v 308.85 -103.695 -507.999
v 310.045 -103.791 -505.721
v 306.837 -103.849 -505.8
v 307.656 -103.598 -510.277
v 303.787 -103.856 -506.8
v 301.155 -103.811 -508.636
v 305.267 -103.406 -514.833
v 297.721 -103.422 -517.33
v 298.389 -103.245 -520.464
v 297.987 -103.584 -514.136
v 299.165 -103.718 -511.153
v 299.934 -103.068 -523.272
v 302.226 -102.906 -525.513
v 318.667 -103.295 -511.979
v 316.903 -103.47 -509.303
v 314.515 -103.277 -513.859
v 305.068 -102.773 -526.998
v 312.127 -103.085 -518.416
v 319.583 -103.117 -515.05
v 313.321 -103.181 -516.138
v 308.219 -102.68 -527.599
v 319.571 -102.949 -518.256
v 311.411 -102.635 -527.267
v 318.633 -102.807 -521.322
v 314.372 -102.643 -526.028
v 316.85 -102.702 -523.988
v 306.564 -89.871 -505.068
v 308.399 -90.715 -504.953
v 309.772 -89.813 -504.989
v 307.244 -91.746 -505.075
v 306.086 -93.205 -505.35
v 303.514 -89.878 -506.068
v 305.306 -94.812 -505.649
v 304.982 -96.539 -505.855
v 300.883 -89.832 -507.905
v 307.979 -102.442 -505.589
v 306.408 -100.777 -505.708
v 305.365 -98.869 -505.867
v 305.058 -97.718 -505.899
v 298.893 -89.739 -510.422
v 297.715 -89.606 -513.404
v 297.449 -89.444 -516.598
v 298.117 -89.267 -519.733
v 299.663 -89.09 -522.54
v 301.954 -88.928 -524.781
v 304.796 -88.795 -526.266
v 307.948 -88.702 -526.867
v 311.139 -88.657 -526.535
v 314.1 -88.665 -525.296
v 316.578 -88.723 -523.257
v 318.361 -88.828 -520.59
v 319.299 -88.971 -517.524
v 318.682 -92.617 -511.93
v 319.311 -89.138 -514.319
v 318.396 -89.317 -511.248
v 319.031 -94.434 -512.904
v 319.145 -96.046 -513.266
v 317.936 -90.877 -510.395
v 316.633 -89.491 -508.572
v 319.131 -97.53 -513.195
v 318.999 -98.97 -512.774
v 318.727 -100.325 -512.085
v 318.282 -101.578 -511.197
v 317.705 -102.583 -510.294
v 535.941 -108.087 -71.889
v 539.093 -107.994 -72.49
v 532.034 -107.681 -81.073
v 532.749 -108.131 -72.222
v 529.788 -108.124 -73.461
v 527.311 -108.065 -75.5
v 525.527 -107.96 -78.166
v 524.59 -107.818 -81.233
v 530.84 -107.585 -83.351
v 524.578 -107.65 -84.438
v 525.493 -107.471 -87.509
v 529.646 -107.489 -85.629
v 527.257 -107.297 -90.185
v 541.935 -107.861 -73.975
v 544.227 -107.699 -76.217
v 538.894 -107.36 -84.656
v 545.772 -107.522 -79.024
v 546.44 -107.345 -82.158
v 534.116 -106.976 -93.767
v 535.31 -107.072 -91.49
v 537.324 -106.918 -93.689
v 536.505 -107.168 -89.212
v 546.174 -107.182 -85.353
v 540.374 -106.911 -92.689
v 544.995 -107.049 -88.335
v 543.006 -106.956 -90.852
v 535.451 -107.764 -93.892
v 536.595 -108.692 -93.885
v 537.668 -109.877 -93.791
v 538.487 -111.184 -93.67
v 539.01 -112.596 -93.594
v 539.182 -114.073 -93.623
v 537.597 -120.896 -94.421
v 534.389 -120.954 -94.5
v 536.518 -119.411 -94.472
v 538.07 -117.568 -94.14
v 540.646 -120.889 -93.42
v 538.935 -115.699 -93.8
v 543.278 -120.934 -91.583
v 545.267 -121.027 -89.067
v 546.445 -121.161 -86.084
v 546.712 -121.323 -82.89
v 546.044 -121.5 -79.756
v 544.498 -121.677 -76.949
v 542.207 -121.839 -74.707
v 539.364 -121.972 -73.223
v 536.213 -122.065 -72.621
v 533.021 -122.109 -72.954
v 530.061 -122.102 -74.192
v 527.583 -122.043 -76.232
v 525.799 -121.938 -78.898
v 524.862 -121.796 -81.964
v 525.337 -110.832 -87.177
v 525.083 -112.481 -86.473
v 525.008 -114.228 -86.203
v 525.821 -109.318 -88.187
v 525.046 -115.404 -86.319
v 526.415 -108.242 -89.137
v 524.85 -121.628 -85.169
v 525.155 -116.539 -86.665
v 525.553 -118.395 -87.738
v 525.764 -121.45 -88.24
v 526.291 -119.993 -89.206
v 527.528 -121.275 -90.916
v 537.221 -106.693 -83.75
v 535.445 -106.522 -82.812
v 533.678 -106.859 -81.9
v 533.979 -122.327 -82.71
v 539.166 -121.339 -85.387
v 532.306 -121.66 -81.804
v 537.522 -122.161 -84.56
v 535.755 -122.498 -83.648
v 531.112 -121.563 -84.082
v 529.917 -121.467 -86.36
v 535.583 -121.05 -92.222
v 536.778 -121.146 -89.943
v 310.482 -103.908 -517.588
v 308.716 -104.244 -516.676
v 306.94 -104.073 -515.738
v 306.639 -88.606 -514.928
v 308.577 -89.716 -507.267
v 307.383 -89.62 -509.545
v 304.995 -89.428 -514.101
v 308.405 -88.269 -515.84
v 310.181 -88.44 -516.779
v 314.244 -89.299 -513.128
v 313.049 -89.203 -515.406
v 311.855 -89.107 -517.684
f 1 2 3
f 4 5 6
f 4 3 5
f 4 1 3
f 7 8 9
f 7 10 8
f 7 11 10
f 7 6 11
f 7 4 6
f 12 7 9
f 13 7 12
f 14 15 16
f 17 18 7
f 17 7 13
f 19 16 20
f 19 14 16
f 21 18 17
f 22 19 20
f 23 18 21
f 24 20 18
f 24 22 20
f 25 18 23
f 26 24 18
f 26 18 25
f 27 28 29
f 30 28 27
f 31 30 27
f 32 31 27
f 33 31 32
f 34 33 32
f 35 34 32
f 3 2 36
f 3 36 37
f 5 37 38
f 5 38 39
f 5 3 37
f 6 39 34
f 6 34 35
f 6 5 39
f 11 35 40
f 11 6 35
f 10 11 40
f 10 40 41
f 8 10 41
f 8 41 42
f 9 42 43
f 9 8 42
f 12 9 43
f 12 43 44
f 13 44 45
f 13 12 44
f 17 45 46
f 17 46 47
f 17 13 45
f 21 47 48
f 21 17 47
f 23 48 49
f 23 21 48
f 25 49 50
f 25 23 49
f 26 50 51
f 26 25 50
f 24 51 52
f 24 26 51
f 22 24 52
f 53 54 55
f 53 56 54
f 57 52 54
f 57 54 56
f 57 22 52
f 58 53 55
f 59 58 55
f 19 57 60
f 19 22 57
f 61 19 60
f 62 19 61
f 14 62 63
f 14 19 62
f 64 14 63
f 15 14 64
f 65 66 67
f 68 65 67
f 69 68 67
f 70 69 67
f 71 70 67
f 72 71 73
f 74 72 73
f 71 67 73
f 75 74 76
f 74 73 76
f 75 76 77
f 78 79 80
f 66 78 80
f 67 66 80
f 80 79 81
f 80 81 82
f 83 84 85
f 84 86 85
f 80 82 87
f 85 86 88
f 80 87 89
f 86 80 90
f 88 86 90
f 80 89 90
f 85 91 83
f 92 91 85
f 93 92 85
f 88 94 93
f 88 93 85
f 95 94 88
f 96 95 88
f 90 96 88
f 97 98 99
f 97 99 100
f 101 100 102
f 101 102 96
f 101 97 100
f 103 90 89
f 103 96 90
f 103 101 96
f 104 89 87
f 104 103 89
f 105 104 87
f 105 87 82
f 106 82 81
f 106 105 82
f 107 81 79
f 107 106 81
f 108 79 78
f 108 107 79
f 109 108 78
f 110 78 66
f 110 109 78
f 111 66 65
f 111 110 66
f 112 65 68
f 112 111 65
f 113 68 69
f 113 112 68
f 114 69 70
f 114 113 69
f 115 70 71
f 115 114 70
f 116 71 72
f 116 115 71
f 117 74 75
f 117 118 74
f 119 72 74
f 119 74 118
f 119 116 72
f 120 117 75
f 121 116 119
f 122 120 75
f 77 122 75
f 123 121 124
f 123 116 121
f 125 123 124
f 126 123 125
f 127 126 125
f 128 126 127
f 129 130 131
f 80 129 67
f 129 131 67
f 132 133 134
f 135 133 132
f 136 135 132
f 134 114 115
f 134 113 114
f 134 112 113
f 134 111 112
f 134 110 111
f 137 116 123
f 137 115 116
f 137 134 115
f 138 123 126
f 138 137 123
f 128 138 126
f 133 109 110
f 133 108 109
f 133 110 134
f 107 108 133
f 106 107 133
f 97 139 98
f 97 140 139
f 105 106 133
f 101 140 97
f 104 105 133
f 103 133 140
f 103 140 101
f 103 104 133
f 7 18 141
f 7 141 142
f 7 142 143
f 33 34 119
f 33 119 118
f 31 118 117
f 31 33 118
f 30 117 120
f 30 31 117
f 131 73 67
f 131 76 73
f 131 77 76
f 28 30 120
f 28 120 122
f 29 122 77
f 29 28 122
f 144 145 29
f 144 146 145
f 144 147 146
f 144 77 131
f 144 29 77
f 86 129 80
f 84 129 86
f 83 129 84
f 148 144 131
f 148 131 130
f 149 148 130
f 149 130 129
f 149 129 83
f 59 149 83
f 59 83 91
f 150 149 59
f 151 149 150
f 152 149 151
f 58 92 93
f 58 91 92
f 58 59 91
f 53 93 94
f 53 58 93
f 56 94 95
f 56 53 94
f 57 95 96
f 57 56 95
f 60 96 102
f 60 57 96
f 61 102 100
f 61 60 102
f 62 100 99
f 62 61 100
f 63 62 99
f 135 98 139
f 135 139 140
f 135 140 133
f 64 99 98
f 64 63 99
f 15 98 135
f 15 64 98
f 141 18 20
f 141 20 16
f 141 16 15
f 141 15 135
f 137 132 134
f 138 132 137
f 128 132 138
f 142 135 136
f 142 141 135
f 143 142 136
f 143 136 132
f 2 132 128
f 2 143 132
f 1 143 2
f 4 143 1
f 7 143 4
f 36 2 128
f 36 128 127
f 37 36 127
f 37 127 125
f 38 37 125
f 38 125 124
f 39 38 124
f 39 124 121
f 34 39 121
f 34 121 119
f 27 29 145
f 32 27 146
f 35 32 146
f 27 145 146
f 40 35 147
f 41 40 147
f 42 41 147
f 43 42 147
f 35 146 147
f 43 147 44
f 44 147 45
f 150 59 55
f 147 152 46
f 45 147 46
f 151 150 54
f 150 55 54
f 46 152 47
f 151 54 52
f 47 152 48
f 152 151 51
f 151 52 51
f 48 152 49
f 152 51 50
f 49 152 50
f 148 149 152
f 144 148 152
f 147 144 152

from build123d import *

# Parameters (mm, degrees)
SUSP_FR_PUSHROD_PROFILE_R                = 8
SUSP_FR_PUSHROD_ROD_END_MOUNT_PROFILE_R  = 11
SUSP_FR_PUSHROD_ROD_END_ROCKER_PROFILE_R = 11


with BuildPart() as part:
    # SUSP_FR_pushrod: sweep along a curve in space
    with BuildLine() as susp_fr_pushrod_path:
        Line((535.6, -114.51, -83.23), (308.5607, -96.2566, -516.2583))
    # SUSP_FR_pushrod profile (on start of the path) → SUSP_FR_pushrod (sweep)
    with BuildSketch(Plane(origin=(535.6, -114.51, -83.23), x_dir=(-0.8856507656122407, 0, 0.46435193697286564), z_dir=(-0.46402868322134944, 0.037306762161055766, -0.8850342290809543))):
        Circle(SUSP_FR_PUSHROD_PROFILE_R)
    sweep(path=susp_fr_pushrod_path.line)

    # SUSP_FR_pushrod_rod_end_mount: sweep along a curve in space
    with BuildLine() as susp_fr_pushrod_rod_end_mount_path:
        Line((535.464194, -107.5209, -82.8638843), (535.735806, -121.4991, -83.5961157))
    # SUSP_FR_pushrod_rod_end_mount profile (on start of the path) → SUSP_FR_pushrod_rod_end_mount (sweep)
    with BuildSketch(Plane(origin=(535.464194, -107.5209, -82.8638843), x_dir=(0, 0.052312087255056115, -0.9986307853891845), z_dir=(0.019400856591433174, -0.9984428287644381, -0.052302241370573335))):
        Circle(SUSP_FR_PUSHROD_ROD_END_MOUNT_PROFILE_R)
    sweep(path=susp_fr_pushrod_rod_end_mount_path.line)

    # SUSP_FR_pushrod_rod_end_rocker: sweep along a curve in space
    with BuildLine() as susp_fr_pushrod_rod_end_rocker_path:
        Line((308.424894, -89.2675002, -515.892184), (308.696506, -103.2457, -516.624416))
    # SUSP_FR_pushrod_rod_end_rocker profile (on start of the path) → SUSP_FR_pushrod_rod_end_rocker (sweep)
    with BuildSketch(Plane(origin=(308.424894, -89.2675002, -515.892184), x_dir=(0, 0.052312130749392324, -0.9986307831107845), z_dir=(0.019400856824669174, -0.9984428264819472, -0.05230228485648652))):
        Circle(SUSP_FR_PUSHROD_ROD_END_ROCKER_PROFILE_R)
    sweep(path=susp_fr_pushrod_rod_end_rocker_path.line)


solid = part.part
